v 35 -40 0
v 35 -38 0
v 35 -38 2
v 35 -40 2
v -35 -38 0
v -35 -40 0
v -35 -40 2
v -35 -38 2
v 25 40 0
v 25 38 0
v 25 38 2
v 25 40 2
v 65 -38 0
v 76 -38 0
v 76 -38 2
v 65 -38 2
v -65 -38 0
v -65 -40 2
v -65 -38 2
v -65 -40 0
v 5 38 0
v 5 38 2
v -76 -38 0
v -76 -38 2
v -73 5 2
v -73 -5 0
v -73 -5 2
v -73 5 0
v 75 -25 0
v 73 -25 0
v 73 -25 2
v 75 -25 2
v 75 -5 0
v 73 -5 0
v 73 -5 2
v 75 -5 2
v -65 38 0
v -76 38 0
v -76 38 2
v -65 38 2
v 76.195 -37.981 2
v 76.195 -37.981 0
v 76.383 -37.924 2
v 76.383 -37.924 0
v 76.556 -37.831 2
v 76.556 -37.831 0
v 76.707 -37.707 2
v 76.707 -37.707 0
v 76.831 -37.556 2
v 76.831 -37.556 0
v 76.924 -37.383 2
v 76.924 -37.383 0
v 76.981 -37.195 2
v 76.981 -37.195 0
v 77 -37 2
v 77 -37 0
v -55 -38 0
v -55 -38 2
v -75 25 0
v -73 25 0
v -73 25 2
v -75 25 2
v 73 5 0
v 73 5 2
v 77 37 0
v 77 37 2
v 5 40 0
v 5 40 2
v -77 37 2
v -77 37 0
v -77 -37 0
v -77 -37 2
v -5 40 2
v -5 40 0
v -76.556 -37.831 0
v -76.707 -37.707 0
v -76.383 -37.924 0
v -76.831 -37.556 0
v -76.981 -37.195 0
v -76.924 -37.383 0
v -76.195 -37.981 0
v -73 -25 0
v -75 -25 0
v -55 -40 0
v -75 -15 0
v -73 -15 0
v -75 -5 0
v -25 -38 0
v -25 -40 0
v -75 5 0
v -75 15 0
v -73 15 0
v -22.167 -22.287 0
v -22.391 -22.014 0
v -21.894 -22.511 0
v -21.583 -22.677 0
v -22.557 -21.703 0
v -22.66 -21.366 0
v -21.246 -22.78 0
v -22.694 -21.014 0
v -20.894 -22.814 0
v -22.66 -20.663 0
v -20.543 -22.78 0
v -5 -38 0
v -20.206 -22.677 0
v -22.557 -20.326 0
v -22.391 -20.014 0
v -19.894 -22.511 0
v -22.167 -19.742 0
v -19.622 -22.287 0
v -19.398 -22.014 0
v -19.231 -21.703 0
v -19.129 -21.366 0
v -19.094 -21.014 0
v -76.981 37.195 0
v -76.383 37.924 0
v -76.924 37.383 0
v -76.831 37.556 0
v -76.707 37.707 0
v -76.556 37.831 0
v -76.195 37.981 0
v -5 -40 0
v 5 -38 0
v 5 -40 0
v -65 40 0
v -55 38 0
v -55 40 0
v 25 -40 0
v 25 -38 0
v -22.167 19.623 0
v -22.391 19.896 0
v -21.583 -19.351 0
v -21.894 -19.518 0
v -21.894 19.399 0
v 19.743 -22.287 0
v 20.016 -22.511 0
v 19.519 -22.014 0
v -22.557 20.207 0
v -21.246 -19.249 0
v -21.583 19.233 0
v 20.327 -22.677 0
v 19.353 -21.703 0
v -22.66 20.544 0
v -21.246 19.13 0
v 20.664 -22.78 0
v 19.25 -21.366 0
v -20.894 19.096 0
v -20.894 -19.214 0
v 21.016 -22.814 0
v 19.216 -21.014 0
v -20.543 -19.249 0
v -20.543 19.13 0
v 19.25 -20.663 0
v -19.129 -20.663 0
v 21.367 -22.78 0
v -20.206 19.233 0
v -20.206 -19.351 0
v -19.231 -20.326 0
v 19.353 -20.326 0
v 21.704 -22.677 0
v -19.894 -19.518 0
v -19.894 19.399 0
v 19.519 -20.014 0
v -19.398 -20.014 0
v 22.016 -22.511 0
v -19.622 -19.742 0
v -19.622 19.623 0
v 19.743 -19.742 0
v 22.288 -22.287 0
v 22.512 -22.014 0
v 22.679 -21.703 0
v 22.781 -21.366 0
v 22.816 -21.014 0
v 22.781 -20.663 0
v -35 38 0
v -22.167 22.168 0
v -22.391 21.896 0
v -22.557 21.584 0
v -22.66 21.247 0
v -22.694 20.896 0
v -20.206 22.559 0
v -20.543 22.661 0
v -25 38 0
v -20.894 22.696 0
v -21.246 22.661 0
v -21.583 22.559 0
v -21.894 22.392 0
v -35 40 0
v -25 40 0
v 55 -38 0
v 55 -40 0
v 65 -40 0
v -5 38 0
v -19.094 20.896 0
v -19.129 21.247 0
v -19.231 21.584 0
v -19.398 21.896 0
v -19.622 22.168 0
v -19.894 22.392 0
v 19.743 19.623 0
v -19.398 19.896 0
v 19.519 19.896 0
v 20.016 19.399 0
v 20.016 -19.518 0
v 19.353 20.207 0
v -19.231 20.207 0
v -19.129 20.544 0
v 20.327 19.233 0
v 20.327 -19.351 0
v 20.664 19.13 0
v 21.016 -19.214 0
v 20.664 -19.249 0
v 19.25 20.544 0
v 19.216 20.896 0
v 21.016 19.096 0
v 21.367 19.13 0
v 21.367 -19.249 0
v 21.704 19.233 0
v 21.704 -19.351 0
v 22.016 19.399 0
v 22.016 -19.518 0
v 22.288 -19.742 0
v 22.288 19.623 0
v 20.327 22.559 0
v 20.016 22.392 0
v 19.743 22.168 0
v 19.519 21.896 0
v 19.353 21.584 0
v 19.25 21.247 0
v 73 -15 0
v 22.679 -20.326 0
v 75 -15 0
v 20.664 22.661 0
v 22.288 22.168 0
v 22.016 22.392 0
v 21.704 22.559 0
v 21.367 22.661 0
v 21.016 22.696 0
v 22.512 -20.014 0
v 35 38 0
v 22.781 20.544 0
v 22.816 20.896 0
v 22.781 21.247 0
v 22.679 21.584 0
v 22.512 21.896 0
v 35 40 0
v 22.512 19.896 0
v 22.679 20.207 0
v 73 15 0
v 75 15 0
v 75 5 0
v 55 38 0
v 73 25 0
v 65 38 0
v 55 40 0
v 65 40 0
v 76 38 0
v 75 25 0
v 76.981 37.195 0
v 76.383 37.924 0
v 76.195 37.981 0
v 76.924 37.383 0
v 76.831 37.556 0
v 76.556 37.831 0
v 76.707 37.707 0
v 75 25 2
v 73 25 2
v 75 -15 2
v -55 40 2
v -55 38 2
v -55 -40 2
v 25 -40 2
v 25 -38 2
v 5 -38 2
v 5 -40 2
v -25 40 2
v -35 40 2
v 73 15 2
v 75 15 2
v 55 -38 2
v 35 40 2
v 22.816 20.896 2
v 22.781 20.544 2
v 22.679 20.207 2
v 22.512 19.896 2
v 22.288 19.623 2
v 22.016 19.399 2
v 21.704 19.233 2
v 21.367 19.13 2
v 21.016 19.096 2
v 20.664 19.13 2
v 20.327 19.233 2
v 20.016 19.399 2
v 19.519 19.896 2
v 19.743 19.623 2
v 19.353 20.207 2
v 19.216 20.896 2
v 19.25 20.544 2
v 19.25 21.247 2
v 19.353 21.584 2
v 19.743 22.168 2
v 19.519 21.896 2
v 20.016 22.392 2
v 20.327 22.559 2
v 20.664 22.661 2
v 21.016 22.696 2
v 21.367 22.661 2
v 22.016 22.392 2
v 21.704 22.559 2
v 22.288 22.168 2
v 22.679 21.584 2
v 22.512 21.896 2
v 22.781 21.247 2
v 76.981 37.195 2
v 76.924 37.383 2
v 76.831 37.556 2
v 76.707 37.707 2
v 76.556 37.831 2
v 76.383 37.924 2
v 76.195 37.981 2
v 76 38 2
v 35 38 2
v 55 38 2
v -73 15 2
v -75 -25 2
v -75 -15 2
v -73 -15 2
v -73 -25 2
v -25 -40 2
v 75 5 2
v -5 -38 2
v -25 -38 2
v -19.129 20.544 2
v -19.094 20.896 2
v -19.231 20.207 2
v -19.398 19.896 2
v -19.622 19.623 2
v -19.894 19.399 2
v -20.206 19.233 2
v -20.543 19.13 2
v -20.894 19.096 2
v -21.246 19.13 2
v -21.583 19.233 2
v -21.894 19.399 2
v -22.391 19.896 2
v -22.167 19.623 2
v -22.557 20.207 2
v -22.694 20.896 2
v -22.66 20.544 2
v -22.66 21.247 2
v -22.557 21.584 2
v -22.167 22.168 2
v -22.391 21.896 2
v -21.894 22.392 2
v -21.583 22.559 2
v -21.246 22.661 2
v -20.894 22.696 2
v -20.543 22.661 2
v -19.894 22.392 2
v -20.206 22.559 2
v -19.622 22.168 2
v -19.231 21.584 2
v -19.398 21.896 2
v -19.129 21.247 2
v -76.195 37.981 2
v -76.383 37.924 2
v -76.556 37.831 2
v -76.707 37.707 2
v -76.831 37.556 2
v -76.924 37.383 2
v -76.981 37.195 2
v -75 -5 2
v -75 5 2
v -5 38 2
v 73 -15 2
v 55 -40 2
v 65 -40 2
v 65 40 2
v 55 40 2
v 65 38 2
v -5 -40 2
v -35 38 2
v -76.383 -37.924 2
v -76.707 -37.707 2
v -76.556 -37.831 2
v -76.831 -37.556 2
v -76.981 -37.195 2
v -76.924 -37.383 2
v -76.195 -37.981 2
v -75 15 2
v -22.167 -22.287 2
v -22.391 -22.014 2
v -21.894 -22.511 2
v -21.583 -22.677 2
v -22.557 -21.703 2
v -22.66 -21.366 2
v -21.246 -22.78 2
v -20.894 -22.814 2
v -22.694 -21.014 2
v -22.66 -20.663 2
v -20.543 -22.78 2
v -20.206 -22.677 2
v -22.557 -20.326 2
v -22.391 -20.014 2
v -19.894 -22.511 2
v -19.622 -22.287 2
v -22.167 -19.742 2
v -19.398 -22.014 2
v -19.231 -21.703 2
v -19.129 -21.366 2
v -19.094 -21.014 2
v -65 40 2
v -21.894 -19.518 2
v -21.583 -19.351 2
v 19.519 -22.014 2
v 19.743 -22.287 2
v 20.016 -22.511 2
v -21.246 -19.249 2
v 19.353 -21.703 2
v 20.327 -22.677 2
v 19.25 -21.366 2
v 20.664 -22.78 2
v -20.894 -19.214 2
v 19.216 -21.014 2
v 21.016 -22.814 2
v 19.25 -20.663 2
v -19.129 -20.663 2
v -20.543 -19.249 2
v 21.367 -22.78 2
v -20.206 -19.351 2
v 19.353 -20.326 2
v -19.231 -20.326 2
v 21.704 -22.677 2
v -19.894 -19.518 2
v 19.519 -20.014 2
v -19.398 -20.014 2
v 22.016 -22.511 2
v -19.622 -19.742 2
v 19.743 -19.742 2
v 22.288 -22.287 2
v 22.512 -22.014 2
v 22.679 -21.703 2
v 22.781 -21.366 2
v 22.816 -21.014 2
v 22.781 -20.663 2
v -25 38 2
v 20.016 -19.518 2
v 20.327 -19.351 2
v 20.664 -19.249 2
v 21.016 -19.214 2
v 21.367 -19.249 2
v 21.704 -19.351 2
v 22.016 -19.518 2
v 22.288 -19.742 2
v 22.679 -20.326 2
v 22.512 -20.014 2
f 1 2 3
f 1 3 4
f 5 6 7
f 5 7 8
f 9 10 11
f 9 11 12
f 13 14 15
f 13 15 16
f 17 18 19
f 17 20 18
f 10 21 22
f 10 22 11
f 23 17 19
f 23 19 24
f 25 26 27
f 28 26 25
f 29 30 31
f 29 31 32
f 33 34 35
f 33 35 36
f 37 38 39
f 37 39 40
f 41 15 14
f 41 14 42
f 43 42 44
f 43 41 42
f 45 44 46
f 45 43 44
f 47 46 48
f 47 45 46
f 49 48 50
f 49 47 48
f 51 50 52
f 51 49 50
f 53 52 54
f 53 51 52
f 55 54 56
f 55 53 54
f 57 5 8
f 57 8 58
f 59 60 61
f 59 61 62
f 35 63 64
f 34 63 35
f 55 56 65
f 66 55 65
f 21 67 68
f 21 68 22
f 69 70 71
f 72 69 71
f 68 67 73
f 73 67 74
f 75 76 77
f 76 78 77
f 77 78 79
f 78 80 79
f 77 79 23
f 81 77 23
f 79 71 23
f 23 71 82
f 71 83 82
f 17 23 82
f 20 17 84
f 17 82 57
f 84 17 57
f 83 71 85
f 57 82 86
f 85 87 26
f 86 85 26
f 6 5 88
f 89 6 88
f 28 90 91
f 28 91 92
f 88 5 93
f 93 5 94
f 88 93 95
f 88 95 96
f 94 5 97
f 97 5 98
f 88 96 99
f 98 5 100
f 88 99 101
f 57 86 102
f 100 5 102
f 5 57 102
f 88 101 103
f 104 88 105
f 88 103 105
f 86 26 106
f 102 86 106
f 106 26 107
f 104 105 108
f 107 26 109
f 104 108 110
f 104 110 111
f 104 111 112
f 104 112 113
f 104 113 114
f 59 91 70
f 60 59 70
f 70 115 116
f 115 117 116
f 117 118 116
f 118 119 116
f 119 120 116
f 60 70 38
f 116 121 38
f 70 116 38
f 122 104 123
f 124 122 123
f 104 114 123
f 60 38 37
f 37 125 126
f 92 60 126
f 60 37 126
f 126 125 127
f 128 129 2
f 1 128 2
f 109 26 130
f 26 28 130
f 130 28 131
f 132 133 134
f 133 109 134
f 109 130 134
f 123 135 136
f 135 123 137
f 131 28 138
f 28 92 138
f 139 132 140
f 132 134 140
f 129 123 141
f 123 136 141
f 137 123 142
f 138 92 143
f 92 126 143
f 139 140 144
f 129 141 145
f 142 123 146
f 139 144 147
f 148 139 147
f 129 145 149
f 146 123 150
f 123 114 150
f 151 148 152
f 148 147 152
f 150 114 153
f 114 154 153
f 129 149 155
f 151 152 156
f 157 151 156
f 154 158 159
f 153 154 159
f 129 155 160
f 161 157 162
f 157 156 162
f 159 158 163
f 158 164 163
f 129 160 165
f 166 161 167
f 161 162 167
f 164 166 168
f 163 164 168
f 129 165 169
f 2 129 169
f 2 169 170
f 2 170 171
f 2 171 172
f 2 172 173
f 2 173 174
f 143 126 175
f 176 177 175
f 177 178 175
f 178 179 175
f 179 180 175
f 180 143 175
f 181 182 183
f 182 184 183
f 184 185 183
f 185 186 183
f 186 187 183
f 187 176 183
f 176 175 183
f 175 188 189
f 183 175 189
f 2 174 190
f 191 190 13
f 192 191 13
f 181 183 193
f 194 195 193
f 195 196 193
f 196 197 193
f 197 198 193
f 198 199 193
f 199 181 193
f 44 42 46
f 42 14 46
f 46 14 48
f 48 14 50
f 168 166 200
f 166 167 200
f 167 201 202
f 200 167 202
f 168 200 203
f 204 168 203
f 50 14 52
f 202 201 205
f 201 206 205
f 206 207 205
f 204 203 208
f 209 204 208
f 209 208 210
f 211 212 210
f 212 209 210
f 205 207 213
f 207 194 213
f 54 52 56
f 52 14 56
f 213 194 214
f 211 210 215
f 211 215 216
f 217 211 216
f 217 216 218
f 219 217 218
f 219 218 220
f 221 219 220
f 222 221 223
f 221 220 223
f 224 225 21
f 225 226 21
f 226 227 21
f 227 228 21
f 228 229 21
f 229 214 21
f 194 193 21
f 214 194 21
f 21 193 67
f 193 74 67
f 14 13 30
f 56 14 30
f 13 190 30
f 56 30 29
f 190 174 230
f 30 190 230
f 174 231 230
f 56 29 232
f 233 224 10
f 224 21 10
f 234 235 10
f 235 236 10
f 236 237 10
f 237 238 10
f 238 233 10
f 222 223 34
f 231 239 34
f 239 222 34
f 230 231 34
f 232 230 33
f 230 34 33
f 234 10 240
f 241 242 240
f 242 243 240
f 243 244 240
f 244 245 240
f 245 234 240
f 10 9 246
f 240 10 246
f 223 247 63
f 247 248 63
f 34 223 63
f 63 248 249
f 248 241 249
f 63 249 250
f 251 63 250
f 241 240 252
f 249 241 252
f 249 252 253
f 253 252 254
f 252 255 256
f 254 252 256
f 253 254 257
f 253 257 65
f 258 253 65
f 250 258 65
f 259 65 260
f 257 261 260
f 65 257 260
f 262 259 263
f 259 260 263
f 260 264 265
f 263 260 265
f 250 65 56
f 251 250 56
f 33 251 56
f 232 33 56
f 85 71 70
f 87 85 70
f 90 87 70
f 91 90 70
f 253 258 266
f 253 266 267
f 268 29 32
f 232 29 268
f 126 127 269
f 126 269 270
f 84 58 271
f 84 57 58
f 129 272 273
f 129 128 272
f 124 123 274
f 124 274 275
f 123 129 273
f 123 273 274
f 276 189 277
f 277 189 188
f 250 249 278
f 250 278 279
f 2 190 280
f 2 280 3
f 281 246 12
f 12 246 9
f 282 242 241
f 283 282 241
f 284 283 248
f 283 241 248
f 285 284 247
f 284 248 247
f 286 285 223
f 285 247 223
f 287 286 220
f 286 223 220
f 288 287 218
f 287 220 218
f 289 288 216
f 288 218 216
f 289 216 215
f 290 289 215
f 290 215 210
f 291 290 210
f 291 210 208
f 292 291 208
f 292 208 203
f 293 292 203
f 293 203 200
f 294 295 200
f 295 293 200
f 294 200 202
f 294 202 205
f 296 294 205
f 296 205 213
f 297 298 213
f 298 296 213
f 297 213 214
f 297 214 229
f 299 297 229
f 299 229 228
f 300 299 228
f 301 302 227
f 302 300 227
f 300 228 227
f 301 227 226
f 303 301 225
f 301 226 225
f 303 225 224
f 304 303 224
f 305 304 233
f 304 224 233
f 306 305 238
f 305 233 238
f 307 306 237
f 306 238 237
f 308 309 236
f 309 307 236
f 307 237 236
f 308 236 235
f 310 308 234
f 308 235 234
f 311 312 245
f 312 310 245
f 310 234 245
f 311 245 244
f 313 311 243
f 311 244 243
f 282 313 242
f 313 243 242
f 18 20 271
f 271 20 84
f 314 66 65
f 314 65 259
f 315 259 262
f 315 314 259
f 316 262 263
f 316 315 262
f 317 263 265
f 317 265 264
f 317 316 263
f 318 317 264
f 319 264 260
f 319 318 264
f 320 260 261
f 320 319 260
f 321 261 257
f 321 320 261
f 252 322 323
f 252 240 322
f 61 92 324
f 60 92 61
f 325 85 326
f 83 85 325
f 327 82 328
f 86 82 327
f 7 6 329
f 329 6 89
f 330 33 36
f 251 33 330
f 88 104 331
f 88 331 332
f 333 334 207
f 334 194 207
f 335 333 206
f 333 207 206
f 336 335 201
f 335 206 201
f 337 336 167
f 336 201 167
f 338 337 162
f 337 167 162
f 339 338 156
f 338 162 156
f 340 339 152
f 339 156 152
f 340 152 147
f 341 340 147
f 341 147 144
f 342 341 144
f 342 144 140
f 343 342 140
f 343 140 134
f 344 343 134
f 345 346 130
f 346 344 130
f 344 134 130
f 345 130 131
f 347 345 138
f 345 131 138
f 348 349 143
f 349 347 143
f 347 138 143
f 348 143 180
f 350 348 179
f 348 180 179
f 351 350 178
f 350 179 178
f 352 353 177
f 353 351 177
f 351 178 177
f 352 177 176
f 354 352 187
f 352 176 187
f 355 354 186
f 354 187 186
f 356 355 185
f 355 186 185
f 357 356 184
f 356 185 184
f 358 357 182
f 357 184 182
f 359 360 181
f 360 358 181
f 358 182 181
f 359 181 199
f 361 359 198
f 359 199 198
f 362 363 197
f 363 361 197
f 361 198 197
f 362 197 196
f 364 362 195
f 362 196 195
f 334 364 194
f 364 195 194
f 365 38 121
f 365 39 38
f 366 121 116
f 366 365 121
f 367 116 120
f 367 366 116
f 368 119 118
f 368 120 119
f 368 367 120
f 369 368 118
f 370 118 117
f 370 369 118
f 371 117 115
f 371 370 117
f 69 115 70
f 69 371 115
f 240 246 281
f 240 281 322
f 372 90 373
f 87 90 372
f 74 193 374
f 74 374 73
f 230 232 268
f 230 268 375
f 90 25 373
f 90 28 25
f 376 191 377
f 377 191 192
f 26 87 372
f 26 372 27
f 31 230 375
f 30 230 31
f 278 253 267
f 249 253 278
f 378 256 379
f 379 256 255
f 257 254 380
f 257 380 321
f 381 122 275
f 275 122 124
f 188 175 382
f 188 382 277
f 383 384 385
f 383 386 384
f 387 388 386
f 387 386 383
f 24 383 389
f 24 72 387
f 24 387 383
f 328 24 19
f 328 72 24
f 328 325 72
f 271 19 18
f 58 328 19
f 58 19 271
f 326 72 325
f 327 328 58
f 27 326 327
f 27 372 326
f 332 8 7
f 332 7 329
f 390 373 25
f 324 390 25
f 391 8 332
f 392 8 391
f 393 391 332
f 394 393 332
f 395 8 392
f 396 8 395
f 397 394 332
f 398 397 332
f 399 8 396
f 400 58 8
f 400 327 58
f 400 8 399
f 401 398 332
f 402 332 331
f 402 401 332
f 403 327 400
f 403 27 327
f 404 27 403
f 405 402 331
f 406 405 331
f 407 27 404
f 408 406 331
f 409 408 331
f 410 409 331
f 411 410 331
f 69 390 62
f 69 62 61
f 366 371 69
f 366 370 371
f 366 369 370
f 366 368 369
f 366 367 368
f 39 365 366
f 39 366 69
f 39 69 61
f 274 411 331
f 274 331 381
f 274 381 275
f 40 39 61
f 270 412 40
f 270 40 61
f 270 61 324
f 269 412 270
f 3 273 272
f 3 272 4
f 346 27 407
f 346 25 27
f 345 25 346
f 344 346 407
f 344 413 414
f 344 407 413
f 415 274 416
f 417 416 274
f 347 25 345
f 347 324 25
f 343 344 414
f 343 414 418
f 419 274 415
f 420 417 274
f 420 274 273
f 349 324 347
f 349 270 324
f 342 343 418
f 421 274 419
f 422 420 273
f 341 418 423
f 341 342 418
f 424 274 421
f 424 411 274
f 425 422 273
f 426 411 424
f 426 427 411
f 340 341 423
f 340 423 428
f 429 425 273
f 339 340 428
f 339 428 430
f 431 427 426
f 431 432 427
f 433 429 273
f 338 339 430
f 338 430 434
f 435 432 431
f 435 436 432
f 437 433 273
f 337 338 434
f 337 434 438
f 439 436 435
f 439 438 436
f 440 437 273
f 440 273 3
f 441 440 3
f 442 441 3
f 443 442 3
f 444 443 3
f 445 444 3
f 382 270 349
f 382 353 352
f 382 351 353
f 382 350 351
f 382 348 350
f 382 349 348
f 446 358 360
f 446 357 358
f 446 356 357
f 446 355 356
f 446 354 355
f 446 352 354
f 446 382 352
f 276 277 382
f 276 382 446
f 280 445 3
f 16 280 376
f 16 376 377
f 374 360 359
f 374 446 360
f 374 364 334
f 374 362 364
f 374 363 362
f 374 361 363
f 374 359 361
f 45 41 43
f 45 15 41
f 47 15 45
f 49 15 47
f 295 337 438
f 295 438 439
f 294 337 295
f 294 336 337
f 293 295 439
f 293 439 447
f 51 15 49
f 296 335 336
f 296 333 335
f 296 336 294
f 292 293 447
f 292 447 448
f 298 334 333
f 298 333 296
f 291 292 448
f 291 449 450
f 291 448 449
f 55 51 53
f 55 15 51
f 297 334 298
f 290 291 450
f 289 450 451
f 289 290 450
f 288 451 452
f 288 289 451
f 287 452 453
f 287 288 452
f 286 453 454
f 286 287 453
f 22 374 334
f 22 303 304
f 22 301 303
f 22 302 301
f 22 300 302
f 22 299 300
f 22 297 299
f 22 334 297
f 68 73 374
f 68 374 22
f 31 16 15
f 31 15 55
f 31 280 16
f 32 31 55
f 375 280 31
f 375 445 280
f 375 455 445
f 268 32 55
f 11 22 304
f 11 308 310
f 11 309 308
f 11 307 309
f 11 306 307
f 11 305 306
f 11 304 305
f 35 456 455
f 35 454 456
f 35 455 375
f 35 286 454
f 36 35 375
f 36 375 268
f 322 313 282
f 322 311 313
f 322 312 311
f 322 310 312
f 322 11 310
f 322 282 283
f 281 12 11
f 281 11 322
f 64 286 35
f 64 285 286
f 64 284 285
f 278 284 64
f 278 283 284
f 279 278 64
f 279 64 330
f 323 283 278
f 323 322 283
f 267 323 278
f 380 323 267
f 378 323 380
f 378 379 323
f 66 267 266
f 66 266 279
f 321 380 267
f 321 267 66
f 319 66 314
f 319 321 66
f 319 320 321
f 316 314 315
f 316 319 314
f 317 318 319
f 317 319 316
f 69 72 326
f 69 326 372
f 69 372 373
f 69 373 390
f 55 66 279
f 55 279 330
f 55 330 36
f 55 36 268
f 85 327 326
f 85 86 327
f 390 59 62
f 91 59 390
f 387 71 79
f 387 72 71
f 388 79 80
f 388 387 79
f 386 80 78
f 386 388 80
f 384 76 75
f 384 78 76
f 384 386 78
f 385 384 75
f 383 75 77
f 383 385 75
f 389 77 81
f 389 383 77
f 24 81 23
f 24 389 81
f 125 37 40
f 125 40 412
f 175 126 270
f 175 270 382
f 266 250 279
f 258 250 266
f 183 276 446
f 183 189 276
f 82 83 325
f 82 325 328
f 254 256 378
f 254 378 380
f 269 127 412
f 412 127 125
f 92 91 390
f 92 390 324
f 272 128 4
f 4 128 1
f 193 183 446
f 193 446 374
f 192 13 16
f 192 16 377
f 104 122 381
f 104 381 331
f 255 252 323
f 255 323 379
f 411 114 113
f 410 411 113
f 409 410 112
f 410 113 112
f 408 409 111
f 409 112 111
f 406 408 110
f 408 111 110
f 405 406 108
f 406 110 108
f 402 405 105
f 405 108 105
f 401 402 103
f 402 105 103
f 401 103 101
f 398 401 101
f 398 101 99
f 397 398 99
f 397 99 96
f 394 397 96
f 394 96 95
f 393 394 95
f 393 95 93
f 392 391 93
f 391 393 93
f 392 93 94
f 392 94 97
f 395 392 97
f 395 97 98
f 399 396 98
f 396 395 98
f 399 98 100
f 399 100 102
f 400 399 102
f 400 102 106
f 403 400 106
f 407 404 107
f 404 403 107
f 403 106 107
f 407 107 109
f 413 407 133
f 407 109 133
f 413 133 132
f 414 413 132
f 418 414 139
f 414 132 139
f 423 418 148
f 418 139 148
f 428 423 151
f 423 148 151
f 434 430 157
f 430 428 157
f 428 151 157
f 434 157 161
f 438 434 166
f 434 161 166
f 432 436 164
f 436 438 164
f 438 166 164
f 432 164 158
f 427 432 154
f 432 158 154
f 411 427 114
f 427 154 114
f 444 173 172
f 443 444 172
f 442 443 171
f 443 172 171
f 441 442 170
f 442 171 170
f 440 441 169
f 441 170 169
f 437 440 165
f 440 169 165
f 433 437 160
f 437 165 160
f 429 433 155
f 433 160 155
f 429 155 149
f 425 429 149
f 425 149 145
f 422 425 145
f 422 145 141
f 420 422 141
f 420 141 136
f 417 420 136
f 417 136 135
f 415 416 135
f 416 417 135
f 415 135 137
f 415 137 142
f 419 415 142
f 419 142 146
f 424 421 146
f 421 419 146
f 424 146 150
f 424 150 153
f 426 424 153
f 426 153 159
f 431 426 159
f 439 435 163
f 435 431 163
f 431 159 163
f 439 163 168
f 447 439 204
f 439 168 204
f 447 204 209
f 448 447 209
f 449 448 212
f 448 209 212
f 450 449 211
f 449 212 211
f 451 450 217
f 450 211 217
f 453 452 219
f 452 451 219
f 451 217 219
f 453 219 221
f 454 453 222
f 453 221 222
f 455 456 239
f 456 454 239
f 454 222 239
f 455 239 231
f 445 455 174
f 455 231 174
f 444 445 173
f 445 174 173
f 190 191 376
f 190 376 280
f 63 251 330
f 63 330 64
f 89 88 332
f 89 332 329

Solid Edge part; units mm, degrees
sketch "Sketch1" plane through (0, 0, 0) normal (0, 0, 1) x (1, 0, 0)
  line L0 (77, -40) -> (77, 40)
  line L1 (77, 40) -> (-77, 40)
  line L2 (-77, 40) -> (-77, -40)
  line L3 (-77, -40) -> (77, -40)
extrude "Protrusion1" add sketch "Sketch1" along normal blind 2
sketch "Sketch2" plane through (0, 0, 0) normal (0, 0, 1) x (1, 0, 0)
  line L0 (-77, 38) -> (-65, 38)
  line L1 (-65, 38) -> (-65, 40)
  line L2 (-65, 40) -> (-77, 40)
  line L3 (-77, 40) -> (-77, 38)
  line L4 (-55, 38) -> (-35, 38)
  line L5 (-35, 38) -> (-35, 40)
  line L6 (-35, 40) -> (-55, 40)
  line L7 (-55, 40) -> (-55, 38)
  line L8 (-25, 38) -> (-5, 38)
  line L9 (-5, 38) -> (-5, 40)
  line L10 (-5, 40) -> (-25, 40)
  line L11 (-25, 40) -> (-25, 38)
  line L12 (5, 38) -> (25, 38)
  line L13 (25, 38) -> (25, 40)
  line L14 (25, 40) -> (5, 40)
  line L15 (5, 40) -> (5, 38)
  line L16 (35, 38) -> (55, 38)
  line L17 (55, 38) -> (55, 40)
  line L18 (55, 40) -> (35, 40)
  line L19 (35, 40) -> (35, 38)
  line L20 (65, 38) -> (77, 38)
  line L21 (77, 38) -> (77, 40)
  line L22 (77, 40) -> (65, 40)
  line L23 (65, 40) -> (65, 38)
  line L24 (73, 25) -> (73, 15)
  line L25 (73, 15) -> (75, 15)
  line L26 (75, 15) -> (75, 25)
  line L27 (75, 25) -> (73, 25)
  line L28 (73, 5) -> (73, -5)
  line L29 (73, -5) -> (75, -5)
  line L30 (75, -5) -> (75, 5)
  line L31 (75, 5) -> (73, 5)
  line L32 (73, -15) -> (73, -25)
  line L33 (73, -25) -> (75, -25)
  line L34 (75, -25) -> (75, -15)
  line L35 (75, -15) -> (73, -15)
  line L36 (77, -38) -> (65, -38)
  line L37 (65, -38) -> (65, -40)
  line L38 (65, -40) -> (77, -40)
  line L39 (77, -40) -> (77, -38)
  line L40 (55, -38) -> (35, -38)
  line L41 (35, -38) -> (35, -40)
  line L42 (35, -40) -> (55, -40)
  line L43 (55, -40) -> (55, -38)
  line L44 (25, -38) -> (5, -38)
  line L45 (5, -38) -> (5, -40)
  line L46 (5, -40) -> (25, -40)
  line L47 (25, -40) -> (25, -38)
  line L48 (-5, -38) -> (-25, -38)
  line L49 (-25, -38) -> (-25, -40)
  line L50 (-25, -40) -> (-5, -40)
  line L51 (-5, -40) -> (-5, -38)
  line L52 (-35, -38) -> (-55, -38)
  line L53 (-55, -38) -> (-55, -40)
  line L54 (-55, -40) -> (-35, -40)
  line L55 (-35, -40) -> (-35, -38)
  line L56 (-65, -38) -> (-77, -38)
  line L57 (-77, -38) -> (-77, -40)
  line L58 (-77, -40) -> (-65, -40)
  line L59 (-65, -40) -> (-65, -38)
  line L60 (-73, -25) -> (-73, -15)
  line L61 (-73, -15) -> (-75, -15)
  line L62 (-75, -15) -> (-75, -25)
  line L63 (-75, -25) -> (-73, -25)
  line L64 (-73, -5) -> (-73, 5)
  line L65 (-73, 5) -> (-75, 5)
  line L66 (-75, 5) -> (-75, -5)
  line L67 (-75, -5) -> (-73, -5)
  line L68 (-73, 15) -> (-73, 25)
  line L69 (-73, 25) -> (-75, 25)
  line L70 (-75, 25) -> (-75, 15)
  line L71 (-75, 15) -> (-73, 15)
  dimension "D1" = 20
  dimension "D2" = 2
  dimension "D3" = 20
  dimension "D4" = 2
  dimension "D5" = 20
  dimension "D6" = 2
  dimension "D7" = 20
  dimension "D8" = 2
  dimension "D9" = 20
  dimension "D10" = 2
  dimension "D11" = 20
  dimension "D12" = 2
  dimension "D13" = 20
  dimension "D14" = 2
  dimension "D15" = 12
  dimension "D16" = 2
  dimension "D17" = 12
  dimension "D18" = 2
  dimension "D19" = 12
  dimension "D20" = 2
  dimension "D21" = 12
  dimension "D22" = 2
  dimension "D23" = 2
  dimension "D24" = 10
  dimension "D25" = 2
  dimension "D26" = 10
  dimension "D27" = 2
  dimension "D28" = 10
  dimension "D29" = 2
  dimension "D30" = 10
  dimension "D31" = 2
  dimension "D32" = 10
  dimension "D33" = 2
  dimension "D34" = 10
  dimension "D35" = 20
  dimension "D36" = 2
  dimension "D37" = 10
  dimension "D38" = 10
  dimension "D39" = 10
  dimension "D40" = 10
  dimension "D41" = 10
  dimension "D42" = 10
  dimension "D43" = 10
  dimension "D44" = 10
  dimension "D45" = 10
  dimension "D46" = 10
  dimension "D47" = 2
  dimension "D48" = 2
  dimension "D49" = 2
  dimension "D50" = 15
  dimension "D51" = 15
  dimension "D52" = 10
  dimension "D53" = 10
  dimension "D54" = 2
  dimension "D55" = 2
  dimension "D56" = 2
  dimension "D57" = 15
  dimension "D58" = 15
  dimension "D59" = 10
  dimension "D60" = 10
extrude "Cutout1" cut sketch "Sketch2" along normal blind 2
sketch "Sketch3" plane through (0, 0, 0) normal (0, 0, 1) x (1, 0, 0)
  circle A0 centre (-20.8944, 20.8956) radius 1.8
  circle A1 centre (21.0156, 20.8956) radius 1.8
  circle A2 centre (21.0156, -21.0144) radius 1.8
  circle A3 centre (-20.8944, -21.0144) radius 1.8
  dimension "D1" = 3.6
  dimension "D2" = 3.6
  dimension "D3" = 3.6
  dimension "D4" = 3.6
  dimension "D5" = 29.55
  dimension "D6" = 41.91
  dimension "D7" = 41.91
  dimension "D8" = 41.91
  dimension "D9" = 41.91
extrude "ExtrudedCutout_3" cut sketch "Sketch3" along normal blind 2
fillet "Round_1" radius 1 4 edges at (-77, -38, 1) (77, -38, 1) (77, 38, 1) (-77, 38, 1)
properties material "Acrylic, high impact grade"
